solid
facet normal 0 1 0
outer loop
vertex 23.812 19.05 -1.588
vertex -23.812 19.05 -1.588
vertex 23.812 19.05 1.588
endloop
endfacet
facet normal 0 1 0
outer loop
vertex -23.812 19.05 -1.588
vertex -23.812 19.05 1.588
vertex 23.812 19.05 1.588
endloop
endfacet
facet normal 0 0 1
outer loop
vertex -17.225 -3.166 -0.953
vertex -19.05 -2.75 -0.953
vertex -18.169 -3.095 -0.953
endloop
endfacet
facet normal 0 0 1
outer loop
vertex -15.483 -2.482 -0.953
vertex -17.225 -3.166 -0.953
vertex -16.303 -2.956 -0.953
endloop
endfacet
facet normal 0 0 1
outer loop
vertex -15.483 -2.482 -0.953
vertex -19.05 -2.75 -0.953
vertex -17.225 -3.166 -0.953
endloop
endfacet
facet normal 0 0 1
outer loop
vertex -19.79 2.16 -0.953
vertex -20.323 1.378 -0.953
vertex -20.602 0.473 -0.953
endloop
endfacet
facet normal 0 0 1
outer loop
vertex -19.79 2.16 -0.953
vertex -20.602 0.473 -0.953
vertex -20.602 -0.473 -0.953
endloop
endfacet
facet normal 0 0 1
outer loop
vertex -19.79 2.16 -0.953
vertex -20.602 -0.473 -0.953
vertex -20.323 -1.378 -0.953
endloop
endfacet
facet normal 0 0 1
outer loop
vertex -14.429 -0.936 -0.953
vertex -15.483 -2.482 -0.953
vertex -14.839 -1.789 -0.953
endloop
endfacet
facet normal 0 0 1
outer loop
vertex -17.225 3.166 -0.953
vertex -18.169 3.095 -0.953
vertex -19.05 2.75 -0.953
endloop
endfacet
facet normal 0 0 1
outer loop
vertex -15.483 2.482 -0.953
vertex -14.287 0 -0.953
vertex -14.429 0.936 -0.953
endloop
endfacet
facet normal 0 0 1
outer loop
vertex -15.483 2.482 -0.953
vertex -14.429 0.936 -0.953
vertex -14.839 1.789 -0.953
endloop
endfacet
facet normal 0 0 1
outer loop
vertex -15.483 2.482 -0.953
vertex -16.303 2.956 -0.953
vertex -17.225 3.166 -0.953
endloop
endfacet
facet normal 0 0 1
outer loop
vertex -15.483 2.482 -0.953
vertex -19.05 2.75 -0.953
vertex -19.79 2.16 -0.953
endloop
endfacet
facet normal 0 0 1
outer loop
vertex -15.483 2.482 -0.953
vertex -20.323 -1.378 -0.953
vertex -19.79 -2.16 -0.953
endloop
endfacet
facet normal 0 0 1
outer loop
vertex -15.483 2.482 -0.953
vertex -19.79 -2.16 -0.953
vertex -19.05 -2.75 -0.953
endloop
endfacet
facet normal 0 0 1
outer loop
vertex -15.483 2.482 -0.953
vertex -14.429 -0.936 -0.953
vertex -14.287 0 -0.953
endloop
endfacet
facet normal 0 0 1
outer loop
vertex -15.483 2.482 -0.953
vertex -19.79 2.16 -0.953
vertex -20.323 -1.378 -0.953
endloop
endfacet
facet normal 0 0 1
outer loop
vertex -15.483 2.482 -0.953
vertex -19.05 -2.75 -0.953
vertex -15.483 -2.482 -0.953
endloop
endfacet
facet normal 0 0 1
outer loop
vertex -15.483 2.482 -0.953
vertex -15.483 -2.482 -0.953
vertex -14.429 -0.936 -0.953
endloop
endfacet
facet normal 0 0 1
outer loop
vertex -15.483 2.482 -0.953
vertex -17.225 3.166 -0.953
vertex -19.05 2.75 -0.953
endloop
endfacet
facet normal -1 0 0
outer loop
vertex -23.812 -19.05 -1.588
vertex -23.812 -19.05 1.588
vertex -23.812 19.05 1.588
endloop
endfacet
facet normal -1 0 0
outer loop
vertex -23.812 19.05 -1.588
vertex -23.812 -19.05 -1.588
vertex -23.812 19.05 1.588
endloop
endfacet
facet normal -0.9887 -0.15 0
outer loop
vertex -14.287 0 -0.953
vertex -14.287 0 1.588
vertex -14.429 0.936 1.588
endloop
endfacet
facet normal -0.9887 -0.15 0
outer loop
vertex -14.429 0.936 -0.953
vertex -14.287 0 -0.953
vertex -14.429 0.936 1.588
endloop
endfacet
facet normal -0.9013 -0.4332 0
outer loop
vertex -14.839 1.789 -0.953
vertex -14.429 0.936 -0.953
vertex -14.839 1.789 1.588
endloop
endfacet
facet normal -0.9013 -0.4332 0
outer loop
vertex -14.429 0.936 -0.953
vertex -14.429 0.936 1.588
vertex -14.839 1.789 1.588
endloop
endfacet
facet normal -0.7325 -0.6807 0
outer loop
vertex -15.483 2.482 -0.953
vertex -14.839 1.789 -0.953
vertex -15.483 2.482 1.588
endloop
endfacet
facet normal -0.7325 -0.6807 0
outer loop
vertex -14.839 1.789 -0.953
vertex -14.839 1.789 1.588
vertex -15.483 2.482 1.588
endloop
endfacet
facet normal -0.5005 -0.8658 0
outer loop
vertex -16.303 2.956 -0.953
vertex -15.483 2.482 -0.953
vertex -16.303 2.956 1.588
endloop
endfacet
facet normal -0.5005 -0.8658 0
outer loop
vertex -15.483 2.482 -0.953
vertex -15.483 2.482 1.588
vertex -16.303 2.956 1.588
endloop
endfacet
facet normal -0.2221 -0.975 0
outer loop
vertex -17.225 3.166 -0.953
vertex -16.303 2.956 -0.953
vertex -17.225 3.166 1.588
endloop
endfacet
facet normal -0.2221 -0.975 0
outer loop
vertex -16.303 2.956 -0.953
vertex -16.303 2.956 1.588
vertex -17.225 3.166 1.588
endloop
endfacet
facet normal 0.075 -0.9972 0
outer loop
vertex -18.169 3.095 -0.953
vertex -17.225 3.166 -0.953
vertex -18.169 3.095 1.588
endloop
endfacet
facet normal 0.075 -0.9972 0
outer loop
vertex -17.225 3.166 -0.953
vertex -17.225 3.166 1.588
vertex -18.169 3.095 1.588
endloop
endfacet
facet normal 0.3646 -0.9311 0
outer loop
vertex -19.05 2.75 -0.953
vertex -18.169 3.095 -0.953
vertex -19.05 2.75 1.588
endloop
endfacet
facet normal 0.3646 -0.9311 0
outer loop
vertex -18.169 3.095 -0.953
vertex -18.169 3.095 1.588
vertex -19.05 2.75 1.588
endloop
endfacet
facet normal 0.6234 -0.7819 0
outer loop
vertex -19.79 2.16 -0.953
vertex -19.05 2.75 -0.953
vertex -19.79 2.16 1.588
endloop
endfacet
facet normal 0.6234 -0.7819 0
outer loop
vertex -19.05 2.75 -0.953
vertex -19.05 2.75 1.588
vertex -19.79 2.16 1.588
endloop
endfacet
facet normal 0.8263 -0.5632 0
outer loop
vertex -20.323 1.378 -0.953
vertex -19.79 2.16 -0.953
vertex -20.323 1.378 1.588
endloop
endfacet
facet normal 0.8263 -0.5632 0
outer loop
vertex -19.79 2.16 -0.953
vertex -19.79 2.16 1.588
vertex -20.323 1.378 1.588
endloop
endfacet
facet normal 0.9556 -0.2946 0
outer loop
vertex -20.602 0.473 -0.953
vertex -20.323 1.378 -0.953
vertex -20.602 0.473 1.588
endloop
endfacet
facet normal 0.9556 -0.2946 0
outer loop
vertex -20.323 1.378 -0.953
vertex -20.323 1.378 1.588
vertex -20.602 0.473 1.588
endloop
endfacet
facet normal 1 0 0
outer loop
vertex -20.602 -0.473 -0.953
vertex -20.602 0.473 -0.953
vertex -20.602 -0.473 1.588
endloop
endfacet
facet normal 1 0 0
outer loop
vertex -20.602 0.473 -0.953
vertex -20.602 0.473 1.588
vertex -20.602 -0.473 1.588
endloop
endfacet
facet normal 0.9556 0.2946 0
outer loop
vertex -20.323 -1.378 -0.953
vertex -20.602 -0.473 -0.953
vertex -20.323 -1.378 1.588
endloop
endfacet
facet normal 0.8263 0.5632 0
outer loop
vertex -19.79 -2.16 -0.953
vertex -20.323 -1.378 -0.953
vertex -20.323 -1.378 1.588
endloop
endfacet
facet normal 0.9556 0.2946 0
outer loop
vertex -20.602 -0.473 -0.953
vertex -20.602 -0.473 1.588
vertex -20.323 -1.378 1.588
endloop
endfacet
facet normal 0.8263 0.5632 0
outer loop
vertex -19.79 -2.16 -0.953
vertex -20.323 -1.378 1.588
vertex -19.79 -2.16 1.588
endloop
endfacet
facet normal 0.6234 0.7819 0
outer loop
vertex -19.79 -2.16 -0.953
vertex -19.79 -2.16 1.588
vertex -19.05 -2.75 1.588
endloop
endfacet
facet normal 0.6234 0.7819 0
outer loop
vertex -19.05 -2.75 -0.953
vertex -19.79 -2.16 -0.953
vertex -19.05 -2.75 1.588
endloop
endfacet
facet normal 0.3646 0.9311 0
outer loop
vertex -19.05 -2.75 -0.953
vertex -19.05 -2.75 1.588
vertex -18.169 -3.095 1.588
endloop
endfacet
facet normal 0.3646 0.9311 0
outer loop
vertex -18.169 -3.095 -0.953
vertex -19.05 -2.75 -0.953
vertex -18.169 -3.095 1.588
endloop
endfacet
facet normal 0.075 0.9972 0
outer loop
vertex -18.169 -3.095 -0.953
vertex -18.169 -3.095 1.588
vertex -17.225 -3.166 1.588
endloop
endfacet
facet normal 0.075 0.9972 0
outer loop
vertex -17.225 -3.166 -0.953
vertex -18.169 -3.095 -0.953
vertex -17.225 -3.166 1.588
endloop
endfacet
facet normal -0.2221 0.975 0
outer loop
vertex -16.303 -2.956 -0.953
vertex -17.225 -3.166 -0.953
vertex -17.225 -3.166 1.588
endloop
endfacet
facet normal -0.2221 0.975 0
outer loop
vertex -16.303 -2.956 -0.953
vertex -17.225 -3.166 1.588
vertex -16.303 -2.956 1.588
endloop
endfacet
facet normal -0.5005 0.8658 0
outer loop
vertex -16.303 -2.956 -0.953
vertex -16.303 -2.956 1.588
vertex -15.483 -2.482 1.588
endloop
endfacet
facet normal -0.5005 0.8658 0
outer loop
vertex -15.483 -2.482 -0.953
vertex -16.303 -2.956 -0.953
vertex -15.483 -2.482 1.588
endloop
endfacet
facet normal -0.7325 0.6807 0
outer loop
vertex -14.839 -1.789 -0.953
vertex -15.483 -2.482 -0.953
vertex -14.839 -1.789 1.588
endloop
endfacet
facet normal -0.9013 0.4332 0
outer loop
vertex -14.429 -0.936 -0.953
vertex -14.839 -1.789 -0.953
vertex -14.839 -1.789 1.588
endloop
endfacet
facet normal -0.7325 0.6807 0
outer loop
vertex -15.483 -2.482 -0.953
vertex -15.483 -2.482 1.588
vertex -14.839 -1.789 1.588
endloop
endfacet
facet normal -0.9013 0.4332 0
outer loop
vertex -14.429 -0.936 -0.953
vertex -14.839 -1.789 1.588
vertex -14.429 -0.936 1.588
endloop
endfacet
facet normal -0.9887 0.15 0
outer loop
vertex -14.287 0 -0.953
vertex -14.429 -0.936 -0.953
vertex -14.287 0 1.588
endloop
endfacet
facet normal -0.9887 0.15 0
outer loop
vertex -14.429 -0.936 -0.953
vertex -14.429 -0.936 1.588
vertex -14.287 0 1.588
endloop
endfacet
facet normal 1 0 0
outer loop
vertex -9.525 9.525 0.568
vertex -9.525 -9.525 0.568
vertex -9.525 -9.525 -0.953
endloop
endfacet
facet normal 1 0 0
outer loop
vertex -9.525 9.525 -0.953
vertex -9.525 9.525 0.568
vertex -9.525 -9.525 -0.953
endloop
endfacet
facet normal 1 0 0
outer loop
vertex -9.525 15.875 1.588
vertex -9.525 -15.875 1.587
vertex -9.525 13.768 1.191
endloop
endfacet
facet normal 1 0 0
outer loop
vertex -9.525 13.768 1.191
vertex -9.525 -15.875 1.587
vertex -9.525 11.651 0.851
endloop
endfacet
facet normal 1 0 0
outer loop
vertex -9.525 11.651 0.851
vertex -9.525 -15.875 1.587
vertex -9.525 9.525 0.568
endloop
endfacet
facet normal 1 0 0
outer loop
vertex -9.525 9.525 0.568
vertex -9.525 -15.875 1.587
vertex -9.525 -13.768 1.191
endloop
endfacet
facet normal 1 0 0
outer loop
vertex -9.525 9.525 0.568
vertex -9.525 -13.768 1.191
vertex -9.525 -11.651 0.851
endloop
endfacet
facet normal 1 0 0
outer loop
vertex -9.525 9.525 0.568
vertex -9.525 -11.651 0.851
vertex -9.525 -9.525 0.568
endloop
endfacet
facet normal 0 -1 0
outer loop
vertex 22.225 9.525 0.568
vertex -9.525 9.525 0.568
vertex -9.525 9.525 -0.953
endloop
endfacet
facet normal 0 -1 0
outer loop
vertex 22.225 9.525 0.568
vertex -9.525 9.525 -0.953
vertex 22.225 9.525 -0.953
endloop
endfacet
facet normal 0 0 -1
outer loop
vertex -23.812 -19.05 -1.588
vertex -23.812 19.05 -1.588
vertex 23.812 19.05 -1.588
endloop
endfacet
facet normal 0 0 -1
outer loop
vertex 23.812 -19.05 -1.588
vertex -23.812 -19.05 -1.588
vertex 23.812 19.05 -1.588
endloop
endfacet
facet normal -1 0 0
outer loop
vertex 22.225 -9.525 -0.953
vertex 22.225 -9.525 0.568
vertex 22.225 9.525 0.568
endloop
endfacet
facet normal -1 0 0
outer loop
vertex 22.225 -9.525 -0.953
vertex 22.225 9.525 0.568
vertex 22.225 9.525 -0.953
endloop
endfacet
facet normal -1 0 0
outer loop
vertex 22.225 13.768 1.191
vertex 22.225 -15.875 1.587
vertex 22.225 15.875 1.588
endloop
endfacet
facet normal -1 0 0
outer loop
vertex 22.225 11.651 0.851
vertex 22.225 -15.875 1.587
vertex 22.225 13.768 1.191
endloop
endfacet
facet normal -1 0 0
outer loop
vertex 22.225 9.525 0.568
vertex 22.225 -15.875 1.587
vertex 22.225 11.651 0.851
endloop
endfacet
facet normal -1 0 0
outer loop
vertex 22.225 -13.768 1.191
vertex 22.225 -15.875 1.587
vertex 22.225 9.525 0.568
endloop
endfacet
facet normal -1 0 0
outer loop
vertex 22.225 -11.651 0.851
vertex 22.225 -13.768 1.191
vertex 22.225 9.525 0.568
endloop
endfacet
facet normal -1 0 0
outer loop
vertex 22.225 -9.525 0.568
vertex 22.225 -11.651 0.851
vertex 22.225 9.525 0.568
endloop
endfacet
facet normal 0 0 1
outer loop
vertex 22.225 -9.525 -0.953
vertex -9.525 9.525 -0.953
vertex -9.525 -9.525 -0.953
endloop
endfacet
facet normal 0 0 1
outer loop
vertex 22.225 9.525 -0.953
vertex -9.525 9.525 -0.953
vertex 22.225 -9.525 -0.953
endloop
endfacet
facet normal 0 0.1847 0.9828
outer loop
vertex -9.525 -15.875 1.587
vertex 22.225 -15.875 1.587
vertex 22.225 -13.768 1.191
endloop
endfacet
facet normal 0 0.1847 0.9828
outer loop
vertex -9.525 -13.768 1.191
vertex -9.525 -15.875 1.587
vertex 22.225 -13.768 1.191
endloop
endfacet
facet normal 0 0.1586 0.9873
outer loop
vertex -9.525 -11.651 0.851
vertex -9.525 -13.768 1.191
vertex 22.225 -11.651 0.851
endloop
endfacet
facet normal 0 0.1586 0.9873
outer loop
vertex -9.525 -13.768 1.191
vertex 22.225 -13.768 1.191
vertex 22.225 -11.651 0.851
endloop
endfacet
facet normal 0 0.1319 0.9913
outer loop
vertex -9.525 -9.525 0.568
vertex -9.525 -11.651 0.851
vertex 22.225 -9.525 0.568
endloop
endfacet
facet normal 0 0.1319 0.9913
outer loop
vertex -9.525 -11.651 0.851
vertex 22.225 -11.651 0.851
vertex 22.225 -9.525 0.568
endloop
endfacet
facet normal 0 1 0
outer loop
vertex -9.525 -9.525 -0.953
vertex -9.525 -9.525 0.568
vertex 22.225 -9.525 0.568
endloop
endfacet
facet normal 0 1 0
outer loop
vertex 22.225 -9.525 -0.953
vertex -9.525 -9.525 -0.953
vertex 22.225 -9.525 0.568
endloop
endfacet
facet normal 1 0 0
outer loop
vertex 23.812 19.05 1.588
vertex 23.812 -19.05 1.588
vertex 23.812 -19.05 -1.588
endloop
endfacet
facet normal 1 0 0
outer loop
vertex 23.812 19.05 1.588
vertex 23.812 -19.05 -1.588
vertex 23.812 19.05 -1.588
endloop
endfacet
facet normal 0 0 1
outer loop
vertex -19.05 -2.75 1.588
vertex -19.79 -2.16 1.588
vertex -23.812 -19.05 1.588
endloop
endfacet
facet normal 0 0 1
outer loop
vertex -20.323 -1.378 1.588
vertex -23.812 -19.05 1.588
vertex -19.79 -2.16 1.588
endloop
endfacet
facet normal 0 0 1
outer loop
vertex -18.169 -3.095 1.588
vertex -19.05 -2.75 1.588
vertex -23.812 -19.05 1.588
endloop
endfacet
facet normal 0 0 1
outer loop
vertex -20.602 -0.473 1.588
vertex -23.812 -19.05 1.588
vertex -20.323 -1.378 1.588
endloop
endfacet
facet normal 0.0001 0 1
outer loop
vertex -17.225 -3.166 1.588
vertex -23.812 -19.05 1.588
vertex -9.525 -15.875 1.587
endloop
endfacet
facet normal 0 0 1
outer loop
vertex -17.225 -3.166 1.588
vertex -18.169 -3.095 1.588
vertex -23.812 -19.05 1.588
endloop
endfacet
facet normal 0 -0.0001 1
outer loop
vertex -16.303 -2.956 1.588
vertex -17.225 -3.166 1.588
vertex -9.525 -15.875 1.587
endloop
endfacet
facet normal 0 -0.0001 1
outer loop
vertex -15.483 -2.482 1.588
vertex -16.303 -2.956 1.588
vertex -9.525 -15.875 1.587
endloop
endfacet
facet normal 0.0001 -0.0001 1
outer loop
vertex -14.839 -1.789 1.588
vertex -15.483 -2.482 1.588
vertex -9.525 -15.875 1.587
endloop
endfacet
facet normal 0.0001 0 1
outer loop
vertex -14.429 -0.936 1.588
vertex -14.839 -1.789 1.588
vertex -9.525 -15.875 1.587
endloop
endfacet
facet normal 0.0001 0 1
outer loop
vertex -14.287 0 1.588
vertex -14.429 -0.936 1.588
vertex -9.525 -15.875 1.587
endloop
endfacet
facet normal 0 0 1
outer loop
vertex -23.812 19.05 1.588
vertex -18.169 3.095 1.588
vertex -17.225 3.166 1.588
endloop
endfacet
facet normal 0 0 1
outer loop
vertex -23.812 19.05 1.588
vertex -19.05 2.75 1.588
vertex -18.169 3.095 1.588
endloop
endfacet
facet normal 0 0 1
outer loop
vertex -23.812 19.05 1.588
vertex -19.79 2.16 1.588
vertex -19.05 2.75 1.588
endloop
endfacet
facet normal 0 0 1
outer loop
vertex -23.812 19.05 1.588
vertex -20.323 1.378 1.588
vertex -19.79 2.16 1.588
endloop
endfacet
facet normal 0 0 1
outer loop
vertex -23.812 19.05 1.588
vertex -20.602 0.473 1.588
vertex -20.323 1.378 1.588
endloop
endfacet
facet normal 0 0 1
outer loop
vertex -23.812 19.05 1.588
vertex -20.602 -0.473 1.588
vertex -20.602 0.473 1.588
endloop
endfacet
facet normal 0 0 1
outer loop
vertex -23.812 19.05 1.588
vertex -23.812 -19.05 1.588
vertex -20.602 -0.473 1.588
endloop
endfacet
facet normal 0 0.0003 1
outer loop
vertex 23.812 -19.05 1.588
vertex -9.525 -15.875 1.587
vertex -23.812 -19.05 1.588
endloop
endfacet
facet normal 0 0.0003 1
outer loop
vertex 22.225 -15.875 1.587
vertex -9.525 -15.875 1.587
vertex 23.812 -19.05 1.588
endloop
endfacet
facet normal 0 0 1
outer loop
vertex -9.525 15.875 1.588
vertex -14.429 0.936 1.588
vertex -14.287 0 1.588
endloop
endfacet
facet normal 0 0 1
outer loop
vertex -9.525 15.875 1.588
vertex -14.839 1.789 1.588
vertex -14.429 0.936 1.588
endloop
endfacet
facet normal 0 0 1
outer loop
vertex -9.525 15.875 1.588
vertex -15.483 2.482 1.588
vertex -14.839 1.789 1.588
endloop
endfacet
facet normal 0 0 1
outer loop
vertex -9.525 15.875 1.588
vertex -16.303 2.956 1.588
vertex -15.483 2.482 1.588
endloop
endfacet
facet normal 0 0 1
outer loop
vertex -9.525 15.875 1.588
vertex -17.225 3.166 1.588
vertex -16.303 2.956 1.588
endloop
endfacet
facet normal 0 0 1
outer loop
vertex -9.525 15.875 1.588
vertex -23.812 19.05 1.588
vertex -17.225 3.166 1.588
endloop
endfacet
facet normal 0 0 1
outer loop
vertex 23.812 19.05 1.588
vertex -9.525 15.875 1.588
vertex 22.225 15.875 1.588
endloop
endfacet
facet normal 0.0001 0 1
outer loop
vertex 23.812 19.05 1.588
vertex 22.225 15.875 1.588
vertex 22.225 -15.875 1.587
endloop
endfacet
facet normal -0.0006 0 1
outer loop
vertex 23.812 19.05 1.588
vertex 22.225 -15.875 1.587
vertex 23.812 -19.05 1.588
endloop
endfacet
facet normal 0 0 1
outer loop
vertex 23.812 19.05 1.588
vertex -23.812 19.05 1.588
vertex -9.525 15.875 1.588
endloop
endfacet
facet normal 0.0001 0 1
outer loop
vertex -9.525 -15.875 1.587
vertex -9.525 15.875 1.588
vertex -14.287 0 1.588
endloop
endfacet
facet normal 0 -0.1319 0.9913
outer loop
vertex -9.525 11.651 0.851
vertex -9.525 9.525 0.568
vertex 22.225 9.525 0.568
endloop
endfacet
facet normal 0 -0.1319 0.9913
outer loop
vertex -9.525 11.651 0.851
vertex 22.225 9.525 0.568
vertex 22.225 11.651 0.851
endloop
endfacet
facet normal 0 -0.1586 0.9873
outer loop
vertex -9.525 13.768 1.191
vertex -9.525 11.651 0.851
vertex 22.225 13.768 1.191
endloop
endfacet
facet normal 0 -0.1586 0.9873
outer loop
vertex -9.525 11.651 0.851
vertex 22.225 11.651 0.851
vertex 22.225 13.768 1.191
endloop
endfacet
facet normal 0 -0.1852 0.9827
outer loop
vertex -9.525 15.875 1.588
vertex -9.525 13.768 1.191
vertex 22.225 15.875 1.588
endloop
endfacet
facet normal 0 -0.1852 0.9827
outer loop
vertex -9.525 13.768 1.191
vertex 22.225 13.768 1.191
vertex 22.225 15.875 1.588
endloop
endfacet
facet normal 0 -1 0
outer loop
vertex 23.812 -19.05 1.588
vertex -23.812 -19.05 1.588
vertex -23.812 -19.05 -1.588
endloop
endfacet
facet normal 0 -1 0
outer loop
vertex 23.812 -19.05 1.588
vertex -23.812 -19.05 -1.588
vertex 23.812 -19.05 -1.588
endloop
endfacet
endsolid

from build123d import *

# Parameters (mm, degrees)
SKETCH1_W           = 47.625
SKETCH1_H           = 38.1
BOSS_EXTRUDE1_DEPTH = 1.5875
SKETCH2_W           = 31.75
SKETCH2_H           = 19.05
SKETCH2_R           = 3.175
CUT_EXTRUDE1_DEPTH  = 2.54
CUT_EXTRUDE2_START  = -1.5875
CUT_EXTRUDE2_DEPTH  = 31.75


with BuildPart() as part:
    # Sketch1 → Boss-Extrude1 (new body, symmetric)
    with BuildSketch(Plane.XY):
        Rectangle(SKETCH1_W, SKETCH1_H)
    extrude(amount=BOSS_EXTRUDE1_DEPTH, both=True)

    # Sketch2 → Cut-Extrude1 (cut)
    with BuildSketch(Plane.XY.offset(1.5875)):
        with Locations((6.35, 0)):
            Rectangle(SKETCH2_W, SKETCH2_H)
        with Locations((-17.4625, 0)):
            Circle(SKETCH2_R)
    extrude(amount=-CUT_EXTRUDE1_DEPTH, mode=Mode.SUBTRACT)

    # Sketch4 → Cut-Extrude2 (cut)
    with BuildSketch(Plane(origin=(23.8125, 0, 0), x_dir=(0, 0, -1), z_dir=(1, 0, 0)).offset(CUT_EXTRUDE2_START)):
        with BuildLine():
            ThreePointArc((0, 0), (-0.397862257, 7.977088774), (-1.5875, 15.875))
            Line((-1.5875, 15.875), (-1.5875, -15.875))
            ThreePointArc((-1.5875, -15.875), (-0.397862257, -7.977088774), (0, 0))
        make_face()
    extrude(amount=-CUT_EXTRUDE2_DEPTH, mode=Mode.SUBTRACT)


solid = part.part
